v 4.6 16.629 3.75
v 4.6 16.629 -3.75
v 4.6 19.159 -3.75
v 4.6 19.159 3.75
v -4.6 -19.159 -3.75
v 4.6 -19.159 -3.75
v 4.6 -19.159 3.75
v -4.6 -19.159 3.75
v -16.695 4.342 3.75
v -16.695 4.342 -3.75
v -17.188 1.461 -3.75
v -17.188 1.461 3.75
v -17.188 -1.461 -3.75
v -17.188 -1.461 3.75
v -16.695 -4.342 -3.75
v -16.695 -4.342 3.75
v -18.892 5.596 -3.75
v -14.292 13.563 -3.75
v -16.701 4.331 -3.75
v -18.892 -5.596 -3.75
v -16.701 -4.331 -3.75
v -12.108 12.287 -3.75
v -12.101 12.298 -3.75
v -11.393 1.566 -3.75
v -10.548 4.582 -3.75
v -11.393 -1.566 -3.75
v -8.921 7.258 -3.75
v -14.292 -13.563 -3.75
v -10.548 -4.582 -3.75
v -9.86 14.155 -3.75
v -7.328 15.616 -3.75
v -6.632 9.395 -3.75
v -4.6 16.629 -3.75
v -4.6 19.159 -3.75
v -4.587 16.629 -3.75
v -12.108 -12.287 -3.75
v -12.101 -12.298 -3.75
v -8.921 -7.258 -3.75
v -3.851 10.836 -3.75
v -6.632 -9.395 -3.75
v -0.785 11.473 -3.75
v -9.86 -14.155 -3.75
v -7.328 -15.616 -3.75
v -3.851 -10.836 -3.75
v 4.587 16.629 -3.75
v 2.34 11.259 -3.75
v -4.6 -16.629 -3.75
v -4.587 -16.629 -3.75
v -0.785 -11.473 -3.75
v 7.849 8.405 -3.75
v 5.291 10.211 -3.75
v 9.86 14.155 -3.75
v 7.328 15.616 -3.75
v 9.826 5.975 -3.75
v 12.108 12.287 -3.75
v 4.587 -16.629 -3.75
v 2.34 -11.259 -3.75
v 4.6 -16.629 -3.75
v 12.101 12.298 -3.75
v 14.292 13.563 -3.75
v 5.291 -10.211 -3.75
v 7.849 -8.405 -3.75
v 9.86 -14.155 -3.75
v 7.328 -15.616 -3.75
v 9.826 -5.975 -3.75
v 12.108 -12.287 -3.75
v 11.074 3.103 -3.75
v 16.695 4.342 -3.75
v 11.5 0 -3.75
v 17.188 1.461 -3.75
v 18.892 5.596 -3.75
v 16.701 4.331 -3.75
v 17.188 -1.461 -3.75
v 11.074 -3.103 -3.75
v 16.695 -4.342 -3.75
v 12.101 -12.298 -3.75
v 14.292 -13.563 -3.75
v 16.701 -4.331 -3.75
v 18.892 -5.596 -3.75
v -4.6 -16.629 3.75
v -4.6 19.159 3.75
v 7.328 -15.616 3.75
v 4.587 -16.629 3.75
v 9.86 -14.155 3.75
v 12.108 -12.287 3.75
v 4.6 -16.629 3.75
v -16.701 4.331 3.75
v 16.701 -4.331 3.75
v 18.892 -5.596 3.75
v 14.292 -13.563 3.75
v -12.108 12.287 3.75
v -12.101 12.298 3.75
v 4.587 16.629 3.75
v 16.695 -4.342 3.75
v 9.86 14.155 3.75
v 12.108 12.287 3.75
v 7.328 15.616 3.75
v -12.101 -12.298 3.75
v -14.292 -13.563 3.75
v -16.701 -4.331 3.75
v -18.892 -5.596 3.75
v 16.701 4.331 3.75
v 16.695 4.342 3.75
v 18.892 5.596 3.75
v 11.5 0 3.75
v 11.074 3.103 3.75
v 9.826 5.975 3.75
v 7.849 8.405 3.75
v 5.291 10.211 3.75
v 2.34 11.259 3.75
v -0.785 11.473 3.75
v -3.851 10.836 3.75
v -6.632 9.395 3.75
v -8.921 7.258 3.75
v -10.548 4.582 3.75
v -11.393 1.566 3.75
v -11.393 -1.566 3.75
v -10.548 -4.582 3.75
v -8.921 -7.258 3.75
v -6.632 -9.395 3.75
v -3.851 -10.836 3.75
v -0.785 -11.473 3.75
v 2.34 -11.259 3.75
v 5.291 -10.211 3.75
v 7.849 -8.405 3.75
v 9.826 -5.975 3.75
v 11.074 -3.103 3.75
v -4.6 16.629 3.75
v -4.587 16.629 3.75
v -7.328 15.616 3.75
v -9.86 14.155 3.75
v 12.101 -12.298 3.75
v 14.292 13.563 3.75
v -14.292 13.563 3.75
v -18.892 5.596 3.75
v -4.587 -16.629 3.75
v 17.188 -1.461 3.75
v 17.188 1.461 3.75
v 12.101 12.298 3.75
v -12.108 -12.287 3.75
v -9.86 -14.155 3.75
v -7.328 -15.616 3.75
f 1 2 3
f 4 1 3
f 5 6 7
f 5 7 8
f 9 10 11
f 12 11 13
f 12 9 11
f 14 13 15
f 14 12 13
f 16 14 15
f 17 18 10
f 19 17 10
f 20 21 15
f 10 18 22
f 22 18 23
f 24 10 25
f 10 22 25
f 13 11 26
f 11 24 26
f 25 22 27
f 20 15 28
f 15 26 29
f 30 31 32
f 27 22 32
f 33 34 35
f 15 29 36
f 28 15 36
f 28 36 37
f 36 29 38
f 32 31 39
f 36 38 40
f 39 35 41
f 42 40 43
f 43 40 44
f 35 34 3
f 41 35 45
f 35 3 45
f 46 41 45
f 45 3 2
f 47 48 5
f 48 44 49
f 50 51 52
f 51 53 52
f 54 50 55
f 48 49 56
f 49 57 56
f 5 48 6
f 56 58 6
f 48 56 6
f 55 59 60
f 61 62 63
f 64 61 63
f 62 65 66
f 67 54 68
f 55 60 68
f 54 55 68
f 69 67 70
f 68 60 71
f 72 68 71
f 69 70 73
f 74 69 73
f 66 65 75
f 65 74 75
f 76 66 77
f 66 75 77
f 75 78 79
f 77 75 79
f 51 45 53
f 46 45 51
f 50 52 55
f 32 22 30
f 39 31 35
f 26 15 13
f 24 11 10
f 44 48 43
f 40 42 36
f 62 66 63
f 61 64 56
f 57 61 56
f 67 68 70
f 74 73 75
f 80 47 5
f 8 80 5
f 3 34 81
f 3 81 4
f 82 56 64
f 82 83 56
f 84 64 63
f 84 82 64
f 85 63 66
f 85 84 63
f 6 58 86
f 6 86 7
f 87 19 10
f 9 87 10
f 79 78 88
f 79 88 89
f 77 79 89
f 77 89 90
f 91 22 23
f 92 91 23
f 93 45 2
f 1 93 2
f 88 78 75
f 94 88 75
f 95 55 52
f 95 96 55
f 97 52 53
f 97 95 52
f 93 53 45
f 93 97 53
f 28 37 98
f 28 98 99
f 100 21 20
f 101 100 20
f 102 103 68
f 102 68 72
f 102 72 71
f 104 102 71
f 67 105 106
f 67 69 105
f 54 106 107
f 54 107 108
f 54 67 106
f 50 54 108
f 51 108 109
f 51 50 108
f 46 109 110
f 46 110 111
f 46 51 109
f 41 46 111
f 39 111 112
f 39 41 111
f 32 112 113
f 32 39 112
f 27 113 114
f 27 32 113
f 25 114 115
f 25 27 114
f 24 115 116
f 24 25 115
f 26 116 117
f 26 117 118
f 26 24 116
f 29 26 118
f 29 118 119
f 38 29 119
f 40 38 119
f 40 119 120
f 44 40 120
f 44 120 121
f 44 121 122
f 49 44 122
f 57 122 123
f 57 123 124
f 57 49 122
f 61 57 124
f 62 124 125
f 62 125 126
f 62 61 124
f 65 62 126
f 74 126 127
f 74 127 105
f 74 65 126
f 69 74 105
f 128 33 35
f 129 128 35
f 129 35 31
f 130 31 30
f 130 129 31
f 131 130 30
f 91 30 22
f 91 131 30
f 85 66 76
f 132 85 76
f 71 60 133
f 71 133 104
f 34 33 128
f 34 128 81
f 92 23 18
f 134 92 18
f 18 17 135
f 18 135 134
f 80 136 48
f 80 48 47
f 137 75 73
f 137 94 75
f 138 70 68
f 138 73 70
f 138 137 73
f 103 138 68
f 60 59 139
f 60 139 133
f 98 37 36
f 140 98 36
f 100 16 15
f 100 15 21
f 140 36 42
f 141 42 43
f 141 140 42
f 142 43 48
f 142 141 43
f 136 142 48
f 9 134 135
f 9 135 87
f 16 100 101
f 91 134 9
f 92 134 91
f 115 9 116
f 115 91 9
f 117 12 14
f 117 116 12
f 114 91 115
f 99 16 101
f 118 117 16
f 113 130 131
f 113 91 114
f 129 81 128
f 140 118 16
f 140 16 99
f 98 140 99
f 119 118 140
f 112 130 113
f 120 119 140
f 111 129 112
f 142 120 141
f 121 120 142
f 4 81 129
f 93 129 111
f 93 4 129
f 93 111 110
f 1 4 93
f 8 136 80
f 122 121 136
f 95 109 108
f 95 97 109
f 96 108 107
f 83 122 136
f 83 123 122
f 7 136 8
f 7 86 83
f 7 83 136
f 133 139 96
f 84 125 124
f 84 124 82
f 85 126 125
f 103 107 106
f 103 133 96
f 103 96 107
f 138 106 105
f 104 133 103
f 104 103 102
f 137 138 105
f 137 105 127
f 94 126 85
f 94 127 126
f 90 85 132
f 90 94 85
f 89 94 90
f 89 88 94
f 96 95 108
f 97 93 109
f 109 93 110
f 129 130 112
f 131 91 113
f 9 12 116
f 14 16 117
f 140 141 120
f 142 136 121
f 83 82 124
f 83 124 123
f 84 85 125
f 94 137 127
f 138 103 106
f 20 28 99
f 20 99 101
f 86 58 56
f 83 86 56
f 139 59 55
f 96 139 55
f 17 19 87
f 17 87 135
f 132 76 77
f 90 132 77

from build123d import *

# Parameters (mm, degrees)
SKETCH2_R           = 17.25
SKETCH2_R_2         = 11.5
BOSS_EXTRUDE1_DEPTH = 3.75
BOSS_EXTRUDE2_START = -3.75
SKETCH3_W           = 9.2
SKETCH3_H           = 2.53
BOSS_EXTRUDE2_DEPTH = 7.5
CIRPATTERN1_COUNT   = 6


with BuildPart() as part:
    # Sketch2 → Boss-Extrude1 (new body, symmetric)
    with BuildSketch(Plane.XY):
        Circle(SKETCH2_R)
        Circle(SKETCH2_R_2, mode=Mode.SUBTRACT)
    extrude(amount=BOSS_EXTRUDE1_DEPTH, both=True)

    # Sketch3 → Boss-Extrude2 (add)
    with BuildSketch(Plane.XY.offset(BOSS_EXTRUDE2_START)):
        with Locations((0, 17.894)):
            Rectangle(SKETCH3_W, SKETCH3_H)
    boss_extrude2 = extrude(amount=BOSS_EXTRUDE2_DEPTH)

    # CirPattern1: Boss-Extrude2 ×6 about axis
    cirpattern1_axis = Axis((0, 0, 0), (0, 0, 1))
    for i in range(1, CIRPATTERN1_COUNT):
        add(boss_extrude2.rotate(cirpattern1_axis, i * 360 / CIRPATTERN1_COUNT))


solid = part.part
